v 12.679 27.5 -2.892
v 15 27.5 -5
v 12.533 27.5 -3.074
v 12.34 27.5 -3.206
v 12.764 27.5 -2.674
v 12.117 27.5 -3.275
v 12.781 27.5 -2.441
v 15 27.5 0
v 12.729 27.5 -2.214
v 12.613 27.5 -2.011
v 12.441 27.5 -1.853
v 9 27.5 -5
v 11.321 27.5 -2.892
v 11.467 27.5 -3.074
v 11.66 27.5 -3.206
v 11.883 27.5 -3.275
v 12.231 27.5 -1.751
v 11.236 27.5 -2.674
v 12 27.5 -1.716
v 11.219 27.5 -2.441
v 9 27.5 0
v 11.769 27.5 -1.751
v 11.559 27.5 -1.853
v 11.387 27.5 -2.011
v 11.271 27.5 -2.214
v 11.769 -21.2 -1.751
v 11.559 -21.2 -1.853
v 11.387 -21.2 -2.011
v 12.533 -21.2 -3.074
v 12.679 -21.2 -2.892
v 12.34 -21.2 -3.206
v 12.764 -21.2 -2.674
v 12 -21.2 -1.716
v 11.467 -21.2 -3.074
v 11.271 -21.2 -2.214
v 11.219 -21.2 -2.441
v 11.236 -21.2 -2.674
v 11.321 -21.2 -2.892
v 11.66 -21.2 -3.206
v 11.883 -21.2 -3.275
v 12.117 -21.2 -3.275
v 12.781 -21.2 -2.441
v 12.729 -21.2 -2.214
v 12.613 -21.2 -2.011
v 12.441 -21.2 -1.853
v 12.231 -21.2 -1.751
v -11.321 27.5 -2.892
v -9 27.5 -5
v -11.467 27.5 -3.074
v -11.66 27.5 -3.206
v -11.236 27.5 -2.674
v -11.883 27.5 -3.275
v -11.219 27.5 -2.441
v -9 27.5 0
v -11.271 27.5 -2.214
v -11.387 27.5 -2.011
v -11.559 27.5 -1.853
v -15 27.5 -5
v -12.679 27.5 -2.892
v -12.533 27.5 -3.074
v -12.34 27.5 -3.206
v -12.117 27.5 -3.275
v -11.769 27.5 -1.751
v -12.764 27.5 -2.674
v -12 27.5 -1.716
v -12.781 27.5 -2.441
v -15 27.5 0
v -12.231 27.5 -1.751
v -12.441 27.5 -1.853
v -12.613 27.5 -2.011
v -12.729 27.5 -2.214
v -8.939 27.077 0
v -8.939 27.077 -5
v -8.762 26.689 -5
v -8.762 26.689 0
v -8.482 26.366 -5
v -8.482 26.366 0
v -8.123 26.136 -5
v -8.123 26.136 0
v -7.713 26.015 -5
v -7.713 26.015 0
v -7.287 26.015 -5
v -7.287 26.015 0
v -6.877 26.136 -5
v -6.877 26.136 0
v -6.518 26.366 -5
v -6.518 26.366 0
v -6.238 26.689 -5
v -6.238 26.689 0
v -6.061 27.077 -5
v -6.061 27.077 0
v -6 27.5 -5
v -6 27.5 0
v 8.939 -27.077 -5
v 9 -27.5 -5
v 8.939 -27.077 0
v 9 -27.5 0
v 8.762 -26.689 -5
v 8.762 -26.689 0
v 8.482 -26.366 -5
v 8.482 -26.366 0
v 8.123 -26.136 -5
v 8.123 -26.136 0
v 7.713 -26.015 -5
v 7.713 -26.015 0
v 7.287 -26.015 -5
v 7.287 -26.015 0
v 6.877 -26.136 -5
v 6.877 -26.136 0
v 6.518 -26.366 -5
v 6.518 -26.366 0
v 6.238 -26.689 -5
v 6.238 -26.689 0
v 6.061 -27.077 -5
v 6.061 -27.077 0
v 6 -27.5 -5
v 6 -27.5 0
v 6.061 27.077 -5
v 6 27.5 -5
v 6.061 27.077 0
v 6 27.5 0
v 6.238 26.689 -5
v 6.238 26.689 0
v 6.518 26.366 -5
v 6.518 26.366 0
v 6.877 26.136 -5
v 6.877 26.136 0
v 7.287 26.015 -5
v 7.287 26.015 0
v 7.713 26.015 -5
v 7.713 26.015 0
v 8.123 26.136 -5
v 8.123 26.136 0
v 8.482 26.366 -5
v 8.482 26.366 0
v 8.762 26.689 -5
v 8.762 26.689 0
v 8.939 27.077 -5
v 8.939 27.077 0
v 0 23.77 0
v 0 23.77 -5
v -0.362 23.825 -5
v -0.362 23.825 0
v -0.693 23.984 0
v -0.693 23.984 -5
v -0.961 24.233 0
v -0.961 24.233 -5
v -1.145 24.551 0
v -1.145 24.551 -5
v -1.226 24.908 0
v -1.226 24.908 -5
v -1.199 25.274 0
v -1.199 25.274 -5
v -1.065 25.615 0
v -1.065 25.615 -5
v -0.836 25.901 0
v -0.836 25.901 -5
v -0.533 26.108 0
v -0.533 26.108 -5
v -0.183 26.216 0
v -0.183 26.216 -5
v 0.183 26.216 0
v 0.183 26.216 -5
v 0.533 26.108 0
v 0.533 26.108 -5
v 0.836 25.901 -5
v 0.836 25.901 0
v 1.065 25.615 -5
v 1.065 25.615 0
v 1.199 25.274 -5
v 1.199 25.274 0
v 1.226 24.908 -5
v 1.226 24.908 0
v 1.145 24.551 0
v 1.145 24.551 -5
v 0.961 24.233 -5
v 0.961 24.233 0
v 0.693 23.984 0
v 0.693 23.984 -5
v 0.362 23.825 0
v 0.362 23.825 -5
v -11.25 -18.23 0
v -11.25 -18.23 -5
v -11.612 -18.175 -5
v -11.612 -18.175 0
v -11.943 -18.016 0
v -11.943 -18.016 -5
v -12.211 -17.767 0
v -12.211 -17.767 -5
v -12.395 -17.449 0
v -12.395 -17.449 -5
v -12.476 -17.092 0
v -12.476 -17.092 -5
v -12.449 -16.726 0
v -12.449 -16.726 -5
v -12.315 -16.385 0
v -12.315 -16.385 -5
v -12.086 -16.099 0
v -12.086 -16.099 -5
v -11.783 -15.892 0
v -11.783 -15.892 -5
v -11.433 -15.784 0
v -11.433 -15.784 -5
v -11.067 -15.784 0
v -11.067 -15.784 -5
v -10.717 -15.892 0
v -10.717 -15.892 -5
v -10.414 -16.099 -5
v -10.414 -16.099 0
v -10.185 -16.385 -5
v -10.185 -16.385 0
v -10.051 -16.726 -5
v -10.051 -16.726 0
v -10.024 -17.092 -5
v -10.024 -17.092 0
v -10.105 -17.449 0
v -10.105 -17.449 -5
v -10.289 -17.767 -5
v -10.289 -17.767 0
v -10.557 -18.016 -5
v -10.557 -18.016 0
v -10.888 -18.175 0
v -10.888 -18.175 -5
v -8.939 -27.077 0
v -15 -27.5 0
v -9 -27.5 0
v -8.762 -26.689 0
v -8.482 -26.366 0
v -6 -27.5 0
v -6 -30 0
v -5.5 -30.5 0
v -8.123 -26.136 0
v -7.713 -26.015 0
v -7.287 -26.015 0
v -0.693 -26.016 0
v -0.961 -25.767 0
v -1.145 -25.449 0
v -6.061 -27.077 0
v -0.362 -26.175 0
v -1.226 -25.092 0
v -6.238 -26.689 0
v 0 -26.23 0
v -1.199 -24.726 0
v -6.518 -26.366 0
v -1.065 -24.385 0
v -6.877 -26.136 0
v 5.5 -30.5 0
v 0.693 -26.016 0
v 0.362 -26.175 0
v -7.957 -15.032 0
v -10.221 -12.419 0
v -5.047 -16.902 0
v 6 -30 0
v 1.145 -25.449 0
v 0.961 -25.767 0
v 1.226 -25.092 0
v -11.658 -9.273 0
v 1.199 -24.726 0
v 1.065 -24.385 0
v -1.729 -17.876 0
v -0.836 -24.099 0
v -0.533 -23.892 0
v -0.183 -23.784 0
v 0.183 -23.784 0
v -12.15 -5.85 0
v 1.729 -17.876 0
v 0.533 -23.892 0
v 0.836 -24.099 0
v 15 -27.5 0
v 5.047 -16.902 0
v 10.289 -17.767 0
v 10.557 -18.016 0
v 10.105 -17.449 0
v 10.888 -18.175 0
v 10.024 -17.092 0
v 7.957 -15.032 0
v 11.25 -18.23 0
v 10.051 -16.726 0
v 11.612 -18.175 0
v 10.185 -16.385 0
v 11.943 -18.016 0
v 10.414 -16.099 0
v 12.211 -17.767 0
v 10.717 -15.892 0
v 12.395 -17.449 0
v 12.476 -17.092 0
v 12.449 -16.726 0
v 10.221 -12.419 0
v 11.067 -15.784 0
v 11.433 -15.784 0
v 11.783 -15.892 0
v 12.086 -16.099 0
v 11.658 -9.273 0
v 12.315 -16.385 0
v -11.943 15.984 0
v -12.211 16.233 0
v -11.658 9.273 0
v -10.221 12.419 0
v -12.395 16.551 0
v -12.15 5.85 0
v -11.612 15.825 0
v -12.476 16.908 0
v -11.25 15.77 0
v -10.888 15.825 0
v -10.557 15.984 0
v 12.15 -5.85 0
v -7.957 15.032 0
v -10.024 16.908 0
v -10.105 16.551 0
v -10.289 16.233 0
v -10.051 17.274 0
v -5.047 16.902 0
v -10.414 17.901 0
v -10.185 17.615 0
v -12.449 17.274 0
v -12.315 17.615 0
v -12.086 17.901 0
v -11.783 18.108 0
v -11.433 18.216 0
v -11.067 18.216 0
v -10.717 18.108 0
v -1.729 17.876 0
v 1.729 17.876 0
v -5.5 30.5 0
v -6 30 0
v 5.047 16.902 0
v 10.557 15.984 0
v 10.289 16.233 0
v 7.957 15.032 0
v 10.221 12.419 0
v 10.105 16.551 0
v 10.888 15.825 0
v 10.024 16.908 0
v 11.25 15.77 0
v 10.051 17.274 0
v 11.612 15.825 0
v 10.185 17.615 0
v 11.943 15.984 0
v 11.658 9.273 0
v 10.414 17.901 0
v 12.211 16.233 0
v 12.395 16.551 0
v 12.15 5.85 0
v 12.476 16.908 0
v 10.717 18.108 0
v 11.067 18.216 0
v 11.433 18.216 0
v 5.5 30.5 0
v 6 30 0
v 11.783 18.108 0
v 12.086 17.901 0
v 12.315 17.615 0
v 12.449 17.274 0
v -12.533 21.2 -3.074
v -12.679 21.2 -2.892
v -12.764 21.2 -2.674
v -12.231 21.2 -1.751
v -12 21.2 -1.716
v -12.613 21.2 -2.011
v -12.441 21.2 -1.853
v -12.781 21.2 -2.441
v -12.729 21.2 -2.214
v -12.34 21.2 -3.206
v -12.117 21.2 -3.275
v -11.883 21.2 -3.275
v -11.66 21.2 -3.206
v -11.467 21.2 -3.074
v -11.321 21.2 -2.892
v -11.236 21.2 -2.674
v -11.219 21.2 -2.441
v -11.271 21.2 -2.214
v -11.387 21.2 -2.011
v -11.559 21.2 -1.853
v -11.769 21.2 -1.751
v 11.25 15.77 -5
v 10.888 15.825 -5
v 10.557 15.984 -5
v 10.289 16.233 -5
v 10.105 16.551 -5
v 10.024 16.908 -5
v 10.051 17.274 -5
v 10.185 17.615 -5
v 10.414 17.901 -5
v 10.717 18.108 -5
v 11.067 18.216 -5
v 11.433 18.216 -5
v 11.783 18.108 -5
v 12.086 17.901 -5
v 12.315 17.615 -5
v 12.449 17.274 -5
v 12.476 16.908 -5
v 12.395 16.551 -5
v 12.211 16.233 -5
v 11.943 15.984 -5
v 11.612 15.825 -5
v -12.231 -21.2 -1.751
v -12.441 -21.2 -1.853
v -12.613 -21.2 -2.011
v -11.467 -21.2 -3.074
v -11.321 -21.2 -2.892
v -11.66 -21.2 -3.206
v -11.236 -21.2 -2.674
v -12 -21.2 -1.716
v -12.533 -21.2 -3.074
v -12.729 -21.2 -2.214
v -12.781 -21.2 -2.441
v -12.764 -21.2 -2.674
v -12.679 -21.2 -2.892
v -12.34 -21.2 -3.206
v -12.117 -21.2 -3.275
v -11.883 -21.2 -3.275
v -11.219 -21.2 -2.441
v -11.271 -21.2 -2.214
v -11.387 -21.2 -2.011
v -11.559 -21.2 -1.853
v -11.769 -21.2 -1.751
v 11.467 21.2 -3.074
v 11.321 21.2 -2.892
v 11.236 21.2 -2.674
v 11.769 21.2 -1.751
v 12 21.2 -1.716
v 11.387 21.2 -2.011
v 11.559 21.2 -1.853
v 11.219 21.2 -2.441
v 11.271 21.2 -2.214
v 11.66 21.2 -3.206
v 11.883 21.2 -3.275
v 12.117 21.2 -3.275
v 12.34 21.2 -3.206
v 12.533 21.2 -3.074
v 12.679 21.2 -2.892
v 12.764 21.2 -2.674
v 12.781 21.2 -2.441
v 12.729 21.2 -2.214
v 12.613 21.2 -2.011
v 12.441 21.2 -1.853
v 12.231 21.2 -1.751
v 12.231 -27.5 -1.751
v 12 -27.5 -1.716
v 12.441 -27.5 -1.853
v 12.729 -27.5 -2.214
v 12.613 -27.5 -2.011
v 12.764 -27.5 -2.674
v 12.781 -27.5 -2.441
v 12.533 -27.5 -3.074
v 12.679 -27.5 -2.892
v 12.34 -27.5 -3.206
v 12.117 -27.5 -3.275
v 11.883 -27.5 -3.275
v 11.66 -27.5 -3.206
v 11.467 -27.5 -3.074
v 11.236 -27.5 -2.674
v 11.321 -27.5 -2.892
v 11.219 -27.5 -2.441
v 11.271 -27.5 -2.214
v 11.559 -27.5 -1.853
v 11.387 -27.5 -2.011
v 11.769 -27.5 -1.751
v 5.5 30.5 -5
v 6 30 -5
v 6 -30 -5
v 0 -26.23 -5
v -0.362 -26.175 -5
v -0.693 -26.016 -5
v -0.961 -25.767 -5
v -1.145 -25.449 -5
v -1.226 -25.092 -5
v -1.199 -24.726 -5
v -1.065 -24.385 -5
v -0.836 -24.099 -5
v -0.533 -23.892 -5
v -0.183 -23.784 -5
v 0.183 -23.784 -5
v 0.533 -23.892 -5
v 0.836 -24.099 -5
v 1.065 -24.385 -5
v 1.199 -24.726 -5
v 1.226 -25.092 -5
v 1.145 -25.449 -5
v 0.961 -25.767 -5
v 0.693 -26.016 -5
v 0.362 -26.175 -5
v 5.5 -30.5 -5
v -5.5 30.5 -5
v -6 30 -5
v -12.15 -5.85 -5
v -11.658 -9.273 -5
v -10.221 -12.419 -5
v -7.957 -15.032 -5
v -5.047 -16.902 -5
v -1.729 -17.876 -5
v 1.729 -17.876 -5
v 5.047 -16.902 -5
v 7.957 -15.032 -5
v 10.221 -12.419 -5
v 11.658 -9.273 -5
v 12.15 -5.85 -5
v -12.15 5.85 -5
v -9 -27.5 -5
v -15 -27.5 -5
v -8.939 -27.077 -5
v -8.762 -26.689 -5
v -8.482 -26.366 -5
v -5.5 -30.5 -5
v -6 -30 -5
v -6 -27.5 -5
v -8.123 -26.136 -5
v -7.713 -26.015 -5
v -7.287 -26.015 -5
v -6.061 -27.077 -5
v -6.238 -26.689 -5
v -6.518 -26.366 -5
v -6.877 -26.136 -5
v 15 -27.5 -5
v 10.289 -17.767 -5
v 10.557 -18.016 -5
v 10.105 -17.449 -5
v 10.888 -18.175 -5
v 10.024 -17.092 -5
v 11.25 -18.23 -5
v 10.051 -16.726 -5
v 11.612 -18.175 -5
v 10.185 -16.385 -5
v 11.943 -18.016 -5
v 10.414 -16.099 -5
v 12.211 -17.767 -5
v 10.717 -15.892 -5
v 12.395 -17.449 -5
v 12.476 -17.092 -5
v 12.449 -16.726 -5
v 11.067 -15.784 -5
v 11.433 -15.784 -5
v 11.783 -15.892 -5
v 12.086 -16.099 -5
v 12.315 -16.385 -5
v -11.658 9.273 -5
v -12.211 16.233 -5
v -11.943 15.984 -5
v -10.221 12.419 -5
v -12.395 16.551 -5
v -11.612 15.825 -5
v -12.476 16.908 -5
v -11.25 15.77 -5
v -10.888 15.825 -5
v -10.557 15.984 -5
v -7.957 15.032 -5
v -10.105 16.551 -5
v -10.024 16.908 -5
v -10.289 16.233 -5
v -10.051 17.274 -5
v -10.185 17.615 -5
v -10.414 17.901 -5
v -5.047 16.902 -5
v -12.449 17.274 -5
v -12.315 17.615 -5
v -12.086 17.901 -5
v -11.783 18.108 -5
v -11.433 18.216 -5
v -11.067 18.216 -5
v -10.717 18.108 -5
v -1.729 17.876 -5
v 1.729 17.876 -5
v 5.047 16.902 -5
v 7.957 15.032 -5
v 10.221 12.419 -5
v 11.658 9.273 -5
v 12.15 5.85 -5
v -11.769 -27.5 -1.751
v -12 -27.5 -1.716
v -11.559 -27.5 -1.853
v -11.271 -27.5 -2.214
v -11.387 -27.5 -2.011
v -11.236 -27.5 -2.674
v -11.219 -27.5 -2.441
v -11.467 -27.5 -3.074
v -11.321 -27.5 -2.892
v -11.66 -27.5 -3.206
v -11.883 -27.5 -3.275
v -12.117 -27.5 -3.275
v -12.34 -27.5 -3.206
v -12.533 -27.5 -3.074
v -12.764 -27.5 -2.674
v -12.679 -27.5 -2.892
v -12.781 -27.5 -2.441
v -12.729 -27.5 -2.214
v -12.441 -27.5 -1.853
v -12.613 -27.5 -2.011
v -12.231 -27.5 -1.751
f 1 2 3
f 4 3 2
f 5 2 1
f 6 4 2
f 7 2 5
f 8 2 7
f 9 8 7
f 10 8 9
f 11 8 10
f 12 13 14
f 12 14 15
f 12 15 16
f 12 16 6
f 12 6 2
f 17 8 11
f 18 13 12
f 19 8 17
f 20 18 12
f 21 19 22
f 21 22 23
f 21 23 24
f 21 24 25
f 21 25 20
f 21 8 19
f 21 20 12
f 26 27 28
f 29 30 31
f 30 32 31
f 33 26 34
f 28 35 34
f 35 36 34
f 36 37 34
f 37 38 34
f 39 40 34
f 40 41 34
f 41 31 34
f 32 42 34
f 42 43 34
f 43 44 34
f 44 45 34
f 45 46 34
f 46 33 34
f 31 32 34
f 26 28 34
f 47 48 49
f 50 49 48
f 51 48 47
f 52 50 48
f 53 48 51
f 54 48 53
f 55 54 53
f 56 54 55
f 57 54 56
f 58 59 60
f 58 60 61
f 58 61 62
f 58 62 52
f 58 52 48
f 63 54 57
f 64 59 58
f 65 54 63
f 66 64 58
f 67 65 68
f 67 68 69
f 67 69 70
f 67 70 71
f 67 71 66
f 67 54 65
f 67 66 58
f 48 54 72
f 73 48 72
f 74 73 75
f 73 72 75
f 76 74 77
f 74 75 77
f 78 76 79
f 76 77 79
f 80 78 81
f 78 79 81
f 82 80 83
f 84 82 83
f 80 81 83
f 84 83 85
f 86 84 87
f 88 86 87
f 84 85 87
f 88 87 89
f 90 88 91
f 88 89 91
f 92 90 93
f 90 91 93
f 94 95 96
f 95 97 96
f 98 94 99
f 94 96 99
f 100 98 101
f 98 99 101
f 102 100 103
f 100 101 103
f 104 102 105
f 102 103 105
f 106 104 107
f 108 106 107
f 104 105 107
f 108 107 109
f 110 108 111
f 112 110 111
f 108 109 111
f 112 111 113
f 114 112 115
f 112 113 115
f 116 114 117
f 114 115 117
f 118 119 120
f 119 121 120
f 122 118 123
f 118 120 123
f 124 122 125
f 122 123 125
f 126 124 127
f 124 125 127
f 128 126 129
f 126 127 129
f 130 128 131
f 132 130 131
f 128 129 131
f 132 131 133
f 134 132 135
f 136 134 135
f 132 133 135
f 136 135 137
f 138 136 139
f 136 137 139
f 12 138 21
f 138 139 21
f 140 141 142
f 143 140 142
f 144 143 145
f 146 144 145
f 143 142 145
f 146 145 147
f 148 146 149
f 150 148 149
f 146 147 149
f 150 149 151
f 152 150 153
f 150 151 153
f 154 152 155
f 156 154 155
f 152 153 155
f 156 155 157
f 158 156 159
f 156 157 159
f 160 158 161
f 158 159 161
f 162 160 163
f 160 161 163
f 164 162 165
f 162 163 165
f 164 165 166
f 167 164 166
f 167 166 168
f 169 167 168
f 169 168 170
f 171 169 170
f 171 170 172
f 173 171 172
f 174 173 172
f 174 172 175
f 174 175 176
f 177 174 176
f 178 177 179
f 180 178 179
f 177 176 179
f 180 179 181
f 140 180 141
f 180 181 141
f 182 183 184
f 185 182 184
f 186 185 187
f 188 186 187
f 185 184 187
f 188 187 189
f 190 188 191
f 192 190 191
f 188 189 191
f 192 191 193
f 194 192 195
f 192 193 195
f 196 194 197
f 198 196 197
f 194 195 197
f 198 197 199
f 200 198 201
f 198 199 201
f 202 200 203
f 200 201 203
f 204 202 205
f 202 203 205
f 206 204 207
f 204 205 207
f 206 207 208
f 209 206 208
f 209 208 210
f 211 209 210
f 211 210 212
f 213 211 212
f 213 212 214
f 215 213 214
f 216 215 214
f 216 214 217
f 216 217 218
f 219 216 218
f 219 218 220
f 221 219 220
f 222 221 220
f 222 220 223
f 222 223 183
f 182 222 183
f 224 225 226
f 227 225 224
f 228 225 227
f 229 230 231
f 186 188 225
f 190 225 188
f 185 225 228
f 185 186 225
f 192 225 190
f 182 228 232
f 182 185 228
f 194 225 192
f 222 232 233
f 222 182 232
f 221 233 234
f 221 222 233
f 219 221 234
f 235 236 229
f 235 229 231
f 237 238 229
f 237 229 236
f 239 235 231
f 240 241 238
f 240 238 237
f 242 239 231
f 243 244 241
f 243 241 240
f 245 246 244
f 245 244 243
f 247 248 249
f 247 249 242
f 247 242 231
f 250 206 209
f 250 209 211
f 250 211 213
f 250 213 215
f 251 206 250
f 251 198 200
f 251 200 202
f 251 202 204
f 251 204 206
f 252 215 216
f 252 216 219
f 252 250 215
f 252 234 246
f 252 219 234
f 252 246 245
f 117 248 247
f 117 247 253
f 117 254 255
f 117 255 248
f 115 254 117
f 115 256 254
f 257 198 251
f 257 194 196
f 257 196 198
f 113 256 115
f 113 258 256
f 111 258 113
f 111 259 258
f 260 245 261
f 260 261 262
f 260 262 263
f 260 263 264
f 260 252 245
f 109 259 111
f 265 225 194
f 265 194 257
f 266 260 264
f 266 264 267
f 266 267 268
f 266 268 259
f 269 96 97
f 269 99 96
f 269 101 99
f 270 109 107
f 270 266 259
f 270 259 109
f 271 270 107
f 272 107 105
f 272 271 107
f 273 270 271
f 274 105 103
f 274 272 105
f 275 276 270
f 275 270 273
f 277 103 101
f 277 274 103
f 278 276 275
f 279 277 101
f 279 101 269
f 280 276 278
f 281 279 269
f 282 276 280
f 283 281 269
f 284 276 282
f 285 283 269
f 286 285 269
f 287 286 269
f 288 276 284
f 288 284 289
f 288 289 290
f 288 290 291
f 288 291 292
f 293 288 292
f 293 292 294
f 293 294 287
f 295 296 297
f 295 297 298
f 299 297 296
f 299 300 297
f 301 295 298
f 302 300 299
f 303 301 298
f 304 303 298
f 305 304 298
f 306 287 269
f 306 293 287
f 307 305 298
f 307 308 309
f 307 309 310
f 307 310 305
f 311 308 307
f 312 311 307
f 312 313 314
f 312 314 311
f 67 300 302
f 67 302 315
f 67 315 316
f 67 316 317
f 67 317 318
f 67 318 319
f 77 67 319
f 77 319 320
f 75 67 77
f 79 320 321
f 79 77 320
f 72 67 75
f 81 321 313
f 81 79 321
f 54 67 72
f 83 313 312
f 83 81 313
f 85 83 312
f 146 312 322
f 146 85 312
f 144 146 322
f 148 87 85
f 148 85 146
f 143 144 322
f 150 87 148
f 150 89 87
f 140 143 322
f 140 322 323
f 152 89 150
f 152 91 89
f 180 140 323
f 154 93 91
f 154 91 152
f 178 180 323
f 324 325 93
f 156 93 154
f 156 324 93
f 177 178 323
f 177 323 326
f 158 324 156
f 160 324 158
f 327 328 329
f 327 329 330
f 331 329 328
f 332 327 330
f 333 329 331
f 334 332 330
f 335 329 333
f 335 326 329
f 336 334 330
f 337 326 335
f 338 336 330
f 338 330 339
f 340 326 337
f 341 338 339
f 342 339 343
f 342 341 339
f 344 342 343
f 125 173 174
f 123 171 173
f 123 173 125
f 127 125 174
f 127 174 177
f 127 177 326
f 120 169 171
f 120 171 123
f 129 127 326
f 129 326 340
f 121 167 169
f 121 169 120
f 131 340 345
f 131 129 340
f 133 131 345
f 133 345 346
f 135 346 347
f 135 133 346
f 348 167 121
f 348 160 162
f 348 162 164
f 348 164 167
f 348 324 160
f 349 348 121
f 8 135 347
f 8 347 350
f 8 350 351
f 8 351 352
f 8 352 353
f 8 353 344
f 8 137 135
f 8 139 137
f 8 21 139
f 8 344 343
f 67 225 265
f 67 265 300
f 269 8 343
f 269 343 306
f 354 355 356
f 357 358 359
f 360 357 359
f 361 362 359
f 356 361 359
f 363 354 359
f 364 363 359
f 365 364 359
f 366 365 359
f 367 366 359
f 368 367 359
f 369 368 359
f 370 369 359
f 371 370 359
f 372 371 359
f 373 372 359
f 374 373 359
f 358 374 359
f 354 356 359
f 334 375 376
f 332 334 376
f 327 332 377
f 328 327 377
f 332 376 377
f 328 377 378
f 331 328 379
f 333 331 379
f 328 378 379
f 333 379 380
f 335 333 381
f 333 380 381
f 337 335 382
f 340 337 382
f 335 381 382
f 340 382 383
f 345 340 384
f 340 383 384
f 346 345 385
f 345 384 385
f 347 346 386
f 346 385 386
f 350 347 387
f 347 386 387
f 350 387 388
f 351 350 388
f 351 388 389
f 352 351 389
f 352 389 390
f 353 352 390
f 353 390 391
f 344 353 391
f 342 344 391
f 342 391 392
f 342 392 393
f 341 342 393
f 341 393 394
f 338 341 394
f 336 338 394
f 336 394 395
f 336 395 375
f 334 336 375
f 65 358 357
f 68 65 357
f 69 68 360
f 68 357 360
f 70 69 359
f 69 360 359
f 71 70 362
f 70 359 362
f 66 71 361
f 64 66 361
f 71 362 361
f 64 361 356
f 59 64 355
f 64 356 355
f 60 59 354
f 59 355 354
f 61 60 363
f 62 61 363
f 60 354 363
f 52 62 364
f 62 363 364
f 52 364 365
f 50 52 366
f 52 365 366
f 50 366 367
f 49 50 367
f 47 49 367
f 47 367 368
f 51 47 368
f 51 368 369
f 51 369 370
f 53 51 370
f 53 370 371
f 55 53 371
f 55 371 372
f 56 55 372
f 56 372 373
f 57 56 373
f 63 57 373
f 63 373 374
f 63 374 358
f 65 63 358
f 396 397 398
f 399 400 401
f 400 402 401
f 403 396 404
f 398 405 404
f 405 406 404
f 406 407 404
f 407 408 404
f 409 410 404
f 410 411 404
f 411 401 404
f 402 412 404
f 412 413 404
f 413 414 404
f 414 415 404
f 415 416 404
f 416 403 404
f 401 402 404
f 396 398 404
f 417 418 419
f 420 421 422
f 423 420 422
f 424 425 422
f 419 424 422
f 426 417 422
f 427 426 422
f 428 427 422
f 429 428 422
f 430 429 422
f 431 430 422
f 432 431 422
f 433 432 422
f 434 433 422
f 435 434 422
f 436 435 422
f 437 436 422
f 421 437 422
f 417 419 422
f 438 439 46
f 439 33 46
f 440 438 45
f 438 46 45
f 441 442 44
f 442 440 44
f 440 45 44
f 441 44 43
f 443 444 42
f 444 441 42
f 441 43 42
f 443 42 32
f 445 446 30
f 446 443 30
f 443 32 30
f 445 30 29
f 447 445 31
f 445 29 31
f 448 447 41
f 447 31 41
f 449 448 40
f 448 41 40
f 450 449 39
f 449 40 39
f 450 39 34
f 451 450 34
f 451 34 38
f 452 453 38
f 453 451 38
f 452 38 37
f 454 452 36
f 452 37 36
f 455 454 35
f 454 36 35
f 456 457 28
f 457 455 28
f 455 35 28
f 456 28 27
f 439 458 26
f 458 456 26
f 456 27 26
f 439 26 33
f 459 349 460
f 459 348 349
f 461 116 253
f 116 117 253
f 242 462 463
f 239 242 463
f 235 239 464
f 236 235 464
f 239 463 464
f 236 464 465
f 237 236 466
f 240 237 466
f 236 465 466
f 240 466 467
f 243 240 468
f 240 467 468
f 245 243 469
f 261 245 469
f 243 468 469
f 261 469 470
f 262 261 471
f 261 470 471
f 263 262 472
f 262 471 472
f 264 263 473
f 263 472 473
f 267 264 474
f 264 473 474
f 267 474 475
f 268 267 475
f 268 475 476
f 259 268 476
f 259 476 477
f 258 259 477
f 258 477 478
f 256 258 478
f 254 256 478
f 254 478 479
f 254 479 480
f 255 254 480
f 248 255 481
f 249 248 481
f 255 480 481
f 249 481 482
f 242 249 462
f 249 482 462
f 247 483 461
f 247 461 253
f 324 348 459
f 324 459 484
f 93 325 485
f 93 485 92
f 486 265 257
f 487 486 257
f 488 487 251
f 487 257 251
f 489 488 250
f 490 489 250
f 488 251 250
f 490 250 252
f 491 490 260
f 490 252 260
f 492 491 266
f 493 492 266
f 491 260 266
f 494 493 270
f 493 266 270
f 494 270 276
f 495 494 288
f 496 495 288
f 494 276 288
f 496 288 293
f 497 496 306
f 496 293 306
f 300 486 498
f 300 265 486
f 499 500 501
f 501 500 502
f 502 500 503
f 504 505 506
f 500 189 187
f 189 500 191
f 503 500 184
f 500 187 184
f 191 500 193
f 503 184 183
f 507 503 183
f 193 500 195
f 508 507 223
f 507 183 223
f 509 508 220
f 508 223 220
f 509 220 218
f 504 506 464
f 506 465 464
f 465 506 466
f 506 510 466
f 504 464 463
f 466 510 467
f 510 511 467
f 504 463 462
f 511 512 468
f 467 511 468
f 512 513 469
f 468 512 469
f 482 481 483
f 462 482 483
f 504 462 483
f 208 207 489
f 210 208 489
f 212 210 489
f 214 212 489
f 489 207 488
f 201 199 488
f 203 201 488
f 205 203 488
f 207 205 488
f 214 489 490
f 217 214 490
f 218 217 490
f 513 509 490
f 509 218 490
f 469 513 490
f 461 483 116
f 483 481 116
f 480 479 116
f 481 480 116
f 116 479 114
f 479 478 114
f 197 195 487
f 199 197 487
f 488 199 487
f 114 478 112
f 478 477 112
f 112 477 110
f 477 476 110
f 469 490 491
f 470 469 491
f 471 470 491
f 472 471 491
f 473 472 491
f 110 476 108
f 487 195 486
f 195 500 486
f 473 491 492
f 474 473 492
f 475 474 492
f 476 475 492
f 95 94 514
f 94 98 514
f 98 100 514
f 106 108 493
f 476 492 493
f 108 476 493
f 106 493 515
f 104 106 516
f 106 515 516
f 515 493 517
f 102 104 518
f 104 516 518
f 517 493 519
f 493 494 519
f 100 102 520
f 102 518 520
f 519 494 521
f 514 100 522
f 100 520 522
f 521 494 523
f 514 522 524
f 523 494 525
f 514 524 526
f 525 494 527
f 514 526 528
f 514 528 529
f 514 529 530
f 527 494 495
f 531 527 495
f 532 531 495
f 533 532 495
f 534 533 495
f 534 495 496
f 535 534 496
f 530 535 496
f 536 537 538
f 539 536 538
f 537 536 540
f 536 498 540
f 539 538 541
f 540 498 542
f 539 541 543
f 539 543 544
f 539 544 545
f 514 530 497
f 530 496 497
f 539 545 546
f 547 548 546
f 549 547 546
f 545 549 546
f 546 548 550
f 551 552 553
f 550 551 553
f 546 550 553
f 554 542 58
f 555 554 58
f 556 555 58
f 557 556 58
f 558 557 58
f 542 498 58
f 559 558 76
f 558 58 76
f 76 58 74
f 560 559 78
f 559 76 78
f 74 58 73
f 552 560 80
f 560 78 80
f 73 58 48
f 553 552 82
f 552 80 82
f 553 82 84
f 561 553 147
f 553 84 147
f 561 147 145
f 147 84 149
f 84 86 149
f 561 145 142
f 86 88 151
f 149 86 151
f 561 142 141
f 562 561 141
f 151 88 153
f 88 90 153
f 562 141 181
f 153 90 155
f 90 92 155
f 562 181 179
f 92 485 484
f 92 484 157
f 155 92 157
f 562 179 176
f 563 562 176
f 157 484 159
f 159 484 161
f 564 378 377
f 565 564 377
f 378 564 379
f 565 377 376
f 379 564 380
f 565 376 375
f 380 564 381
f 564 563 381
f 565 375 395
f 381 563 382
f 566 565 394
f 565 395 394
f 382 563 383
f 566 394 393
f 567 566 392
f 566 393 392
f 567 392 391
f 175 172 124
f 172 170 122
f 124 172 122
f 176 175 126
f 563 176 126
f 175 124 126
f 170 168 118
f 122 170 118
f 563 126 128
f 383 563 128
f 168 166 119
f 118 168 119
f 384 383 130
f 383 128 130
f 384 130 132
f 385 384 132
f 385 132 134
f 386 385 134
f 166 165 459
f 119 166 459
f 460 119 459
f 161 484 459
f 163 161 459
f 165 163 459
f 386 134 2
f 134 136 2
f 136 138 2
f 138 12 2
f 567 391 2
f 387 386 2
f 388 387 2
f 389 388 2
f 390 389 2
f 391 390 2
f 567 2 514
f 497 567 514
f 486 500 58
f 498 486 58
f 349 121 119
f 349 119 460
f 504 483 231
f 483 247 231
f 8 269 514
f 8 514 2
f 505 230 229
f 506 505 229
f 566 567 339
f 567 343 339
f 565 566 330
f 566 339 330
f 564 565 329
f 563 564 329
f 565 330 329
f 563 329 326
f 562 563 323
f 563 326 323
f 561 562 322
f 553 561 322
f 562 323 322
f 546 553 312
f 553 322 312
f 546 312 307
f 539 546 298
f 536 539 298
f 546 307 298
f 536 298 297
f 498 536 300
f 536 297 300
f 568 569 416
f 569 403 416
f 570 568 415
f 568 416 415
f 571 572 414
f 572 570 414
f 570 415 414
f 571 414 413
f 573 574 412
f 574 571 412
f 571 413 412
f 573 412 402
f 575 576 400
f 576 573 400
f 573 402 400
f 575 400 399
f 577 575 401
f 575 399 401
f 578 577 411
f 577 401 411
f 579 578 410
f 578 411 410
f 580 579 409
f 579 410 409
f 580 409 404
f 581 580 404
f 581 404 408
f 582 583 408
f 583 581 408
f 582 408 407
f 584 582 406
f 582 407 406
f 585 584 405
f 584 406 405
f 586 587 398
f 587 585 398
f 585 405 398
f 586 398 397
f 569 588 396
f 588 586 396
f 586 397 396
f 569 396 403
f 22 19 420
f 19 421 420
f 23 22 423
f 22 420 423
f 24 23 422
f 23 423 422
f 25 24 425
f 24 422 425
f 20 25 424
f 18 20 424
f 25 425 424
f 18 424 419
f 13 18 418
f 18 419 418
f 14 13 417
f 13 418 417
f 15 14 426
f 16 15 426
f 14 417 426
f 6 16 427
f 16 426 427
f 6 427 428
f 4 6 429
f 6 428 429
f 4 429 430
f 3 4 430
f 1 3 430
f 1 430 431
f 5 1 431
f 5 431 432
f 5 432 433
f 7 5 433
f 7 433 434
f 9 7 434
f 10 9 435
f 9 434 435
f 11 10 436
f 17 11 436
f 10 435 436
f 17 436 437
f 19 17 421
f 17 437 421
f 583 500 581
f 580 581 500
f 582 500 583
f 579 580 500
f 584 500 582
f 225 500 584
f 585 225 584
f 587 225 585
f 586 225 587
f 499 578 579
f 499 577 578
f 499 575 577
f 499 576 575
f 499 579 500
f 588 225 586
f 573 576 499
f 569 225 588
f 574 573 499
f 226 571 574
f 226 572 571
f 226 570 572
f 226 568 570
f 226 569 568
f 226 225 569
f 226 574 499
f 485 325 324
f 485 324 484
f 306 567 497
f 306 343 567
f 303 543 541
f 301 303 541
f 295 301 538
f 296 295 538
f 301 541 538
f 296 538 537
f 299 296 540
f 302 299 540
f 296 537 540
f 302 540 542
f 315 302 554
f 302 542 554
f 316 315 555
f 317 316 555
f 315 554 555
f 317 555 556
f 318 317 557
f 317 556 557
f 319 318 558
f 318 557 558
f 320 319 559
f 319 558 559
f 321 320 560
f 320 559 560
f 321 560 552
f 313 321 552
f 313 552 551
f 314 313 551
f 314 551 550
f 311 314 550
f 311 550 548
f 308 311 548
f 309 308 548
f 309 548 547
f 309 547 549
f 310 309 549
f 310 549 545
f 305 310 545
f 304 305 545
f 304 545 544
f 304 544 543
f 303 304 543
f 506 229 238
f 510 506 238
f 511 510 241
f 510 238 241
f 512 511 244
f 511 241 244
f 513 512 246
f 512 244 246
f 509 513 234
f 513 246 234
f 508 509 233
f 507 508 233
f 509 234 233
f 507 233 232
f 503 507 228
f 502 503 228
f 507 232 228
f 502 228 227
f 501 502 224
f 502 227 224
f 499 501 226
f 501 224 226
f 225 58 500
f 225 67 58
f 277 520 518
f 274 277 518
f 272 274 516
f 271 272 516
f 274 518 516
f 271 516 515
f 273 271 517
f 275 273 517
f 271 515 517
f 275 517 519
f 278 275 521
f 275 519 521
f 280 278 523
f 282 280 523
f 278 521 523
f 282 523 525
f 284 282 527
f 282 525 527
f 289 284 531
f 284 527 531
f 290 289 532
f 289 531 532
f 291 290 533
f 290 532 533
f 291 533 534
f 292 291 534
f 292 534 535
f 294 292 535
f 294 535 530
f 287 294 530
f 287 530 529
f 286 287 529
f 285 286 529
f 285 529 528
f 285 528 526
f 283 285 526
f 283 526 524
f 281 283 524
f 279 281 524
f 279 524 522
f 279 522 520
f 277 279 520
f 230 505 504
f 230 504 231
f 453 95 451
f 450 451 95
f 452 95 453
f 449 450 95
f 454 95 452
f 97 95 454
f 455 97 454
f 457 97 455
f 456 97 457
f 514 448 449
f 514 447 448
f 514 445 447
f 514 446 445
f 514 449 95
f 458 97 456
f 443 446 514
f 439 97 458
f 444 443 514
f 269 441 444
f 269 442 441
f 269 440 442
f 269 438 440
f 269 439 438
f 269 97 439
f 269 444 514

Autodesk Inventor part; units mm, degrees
ref_plane "YZ Plane" through (0, 0, 0) normal (1, 0, 0) x (0, 1, 0)
ref_plane "XZ Plane" through (0, 0, 0) normal (0, 1, 0) x (-1, 0, 0)
ref_plane "XY Plane" through (0, 0, 0) normal (0, 0, 1) x (1, 0, 0)
sketch "Sketch1" plane through (0, 0, 0) normal (0, 0, 1) x (1, 0, 0)
  line L0 (15, 27.5) -> (-15, 27.5)
  line L1 (-15, 27.5) -> (-15, -27.5)
  line L2 (-15, -27.5) -> (15, -27.5)
  line L3 (15, -27.5) -> (15, 27.5)
  line L4 (15, 27.5) -> (-15, -27.5) construction
  line L5 (-15, 27.5) -> (15, -27.5) construction
  line L6 (11.25, 17) -> (-11.25, 17) construction
  line L7 (-11.25, 17) -> (-11.25, -17) construction
  line L8 (-11.25, -17) -> (11.25, -17) construction
  line L9 (11.25, -17) -> (11.25, 17) construction
  line L10 (11.25, 17) -> (-11.25, -17) construction
  line L11 (-11.25, 17) -> (11.25, -17) construction
  line L12 (0, 27.5) -> (0, -27.5) construction
  line L13 (15, 0) -> (-15, 0) construction
  line L14 (6, 27.5) -> (6, 30.5)
  line L15 (6, 30.5) -> (-6, 30.5)
  line L16 (-6, 30.5) -> (-6, 27.5)
  arc A0 (-9, 27.5) -> (-6, 27.5) centre (-7.5, 27.5) ccw
  line L17 (6, -27.5) -> (6, -30.5)
  line L18 (6, -30.5) -> (-6, -30.5)
  line L19 (-6, -30.5) -> (-6, -27.5)
  arc A1 (-6, -27.5) -> (-9, -27.5) centre (-7.5, -27.5) ccw
  line L20 (-12, 27.5) -> (-12, 21.5) construction
  line L21 (0, 30.5) -> (0, 27.5) construction
  line L22 (12, 27.5) -> (12, 21.5) construction
  arc A2 (6, 27.5) -> (9, 27.5) centre (7.5, 27.5) ccw
  line L23 (12, -27.5) -> (12, -21.5) construction
  arc A3 (9, -27.5) -> (6, -27.5) centre (7.5, -27.5) ccw
  line L24 (-14.15, -20) -> (14.15, -20) construction
  line L25 (14.15, -20) -> (14.15, 20) construction
  line L26 (14.15, 20) -> (-14.15, 20) construction
  line L27 (-14.15, 20) -> (-14.15, -20) construction
  line L28 (-14.15, -20) -> (14.15, 20) construction
  line L29 (14.15, -20) -> (-14.15, 20) construction
  arc A4 (-12.15, -5.85) -> (12.15, -5.85) centre (0, -5.85) ccw
  line L30 (12.15, -5.85) -> (-12.15, -5.85) construction
  arc A5 (12.15, 5.85) -> (-12.15, 5.85) centre (0, 5.85) ccw
  line L31 (-12.15, -5.85) -> (-12.15, 5.85)
  line L32 (12.15, 5.85) -> (12.15, -5.85)
  circle A6 centre (11.25, 17) radius 1.5 construction
  point P0 (0, 0)
  point P1 (0, 0)
  point P2 (0, 0)
  point P3 (-9, -27.5)
  point P4 (6, -27.5)
  point P5 (-6, -27.5)
  point P6 (-6, -27.5)
  point P7 (6, -27.5)
  point P8 (9, -27.5)
  point P9 (0, 25)
  point P10 (0, -25)
  dimension "d0" = 22.5
  dimension "d1" = 34
  dimension "d19" = 3
  dimension "d37" = 55
  dimension "d40" = 6
  dimension "d41" = 6
  dimension "d57" = 30
  dimension "d58" = 1.5
  dimension "d59" = 28.3
  dimension "d60" = 40
  dimension "d61" = 2
  dimension "d62" = 2
  dimension "d63" = 9
  dimension "d64" = 12
  dimension "d65" = 3
  dimension "d66" = 50
extrude "Extrusion1" add sketch "Sketch1" against normal blind 5 contours L3 L2 A3 A1 L1 L0 A0 A2 | L0 L16 L15 L14 | L17 L18 L19 L2 | L31 A5 L32 A4
extrude "Extrusion2" cut sketch "Sketch1" against normal through all contours L31 A5 L32 A4
hole "M3" at (11.25, 17, 0) at (-11.25, 17, 0) at (-11.25, -17, 0) at (11.25, -17, 0) at (0, -25, 0) at (0, 25, 0) direction (0, 0, -1) diameter 2.459 end through all thread size "M3x0.5" class "6H" standard "ANSI Metric M Profile"
sketch "Sketch2" plane through (-15, 27.5, 0) normal (0, 1, 0) x (1, 0, 0)
  line L0 (3, 5) -> (3, 0)
  line L1 (30, 0) -> (0, 0) projected
  line L2 (27, 5) -> (27, 0)
  line L3 (24, 5) -> (30, 5) projected
  line L4 (0, 5) -> (6, 5) projected
  point P0 (15, 0)
  point P1 (6, 0)
  point P2 (3, 2.5)
  point P3 (3, 0)
  point P4 (27, 2.5)
hole "Side-M2" at (-12, 27.5, -2.5) at (12, 27.5, -2.5) direction (0, -1, 0) diameter 1.567 depth 6.3 thread size "M2x0.4" class "6H" standard "ANSI Metric M Profile"
chamfer "C0.5" distance 0.5 angle 45 4 edges at (6, -30.5, -2.5) (-6, -30.5, -2.5) (6, 30.5, -2.5) (-6, 30.5, -2.5)
mirror "Mirror1" about plane through (0, 0, 0) normal (0, 1, 0) of "Side-M2"
properties part number "HeadSpeakerMountFrame" material "Acetal Resin, Black"
